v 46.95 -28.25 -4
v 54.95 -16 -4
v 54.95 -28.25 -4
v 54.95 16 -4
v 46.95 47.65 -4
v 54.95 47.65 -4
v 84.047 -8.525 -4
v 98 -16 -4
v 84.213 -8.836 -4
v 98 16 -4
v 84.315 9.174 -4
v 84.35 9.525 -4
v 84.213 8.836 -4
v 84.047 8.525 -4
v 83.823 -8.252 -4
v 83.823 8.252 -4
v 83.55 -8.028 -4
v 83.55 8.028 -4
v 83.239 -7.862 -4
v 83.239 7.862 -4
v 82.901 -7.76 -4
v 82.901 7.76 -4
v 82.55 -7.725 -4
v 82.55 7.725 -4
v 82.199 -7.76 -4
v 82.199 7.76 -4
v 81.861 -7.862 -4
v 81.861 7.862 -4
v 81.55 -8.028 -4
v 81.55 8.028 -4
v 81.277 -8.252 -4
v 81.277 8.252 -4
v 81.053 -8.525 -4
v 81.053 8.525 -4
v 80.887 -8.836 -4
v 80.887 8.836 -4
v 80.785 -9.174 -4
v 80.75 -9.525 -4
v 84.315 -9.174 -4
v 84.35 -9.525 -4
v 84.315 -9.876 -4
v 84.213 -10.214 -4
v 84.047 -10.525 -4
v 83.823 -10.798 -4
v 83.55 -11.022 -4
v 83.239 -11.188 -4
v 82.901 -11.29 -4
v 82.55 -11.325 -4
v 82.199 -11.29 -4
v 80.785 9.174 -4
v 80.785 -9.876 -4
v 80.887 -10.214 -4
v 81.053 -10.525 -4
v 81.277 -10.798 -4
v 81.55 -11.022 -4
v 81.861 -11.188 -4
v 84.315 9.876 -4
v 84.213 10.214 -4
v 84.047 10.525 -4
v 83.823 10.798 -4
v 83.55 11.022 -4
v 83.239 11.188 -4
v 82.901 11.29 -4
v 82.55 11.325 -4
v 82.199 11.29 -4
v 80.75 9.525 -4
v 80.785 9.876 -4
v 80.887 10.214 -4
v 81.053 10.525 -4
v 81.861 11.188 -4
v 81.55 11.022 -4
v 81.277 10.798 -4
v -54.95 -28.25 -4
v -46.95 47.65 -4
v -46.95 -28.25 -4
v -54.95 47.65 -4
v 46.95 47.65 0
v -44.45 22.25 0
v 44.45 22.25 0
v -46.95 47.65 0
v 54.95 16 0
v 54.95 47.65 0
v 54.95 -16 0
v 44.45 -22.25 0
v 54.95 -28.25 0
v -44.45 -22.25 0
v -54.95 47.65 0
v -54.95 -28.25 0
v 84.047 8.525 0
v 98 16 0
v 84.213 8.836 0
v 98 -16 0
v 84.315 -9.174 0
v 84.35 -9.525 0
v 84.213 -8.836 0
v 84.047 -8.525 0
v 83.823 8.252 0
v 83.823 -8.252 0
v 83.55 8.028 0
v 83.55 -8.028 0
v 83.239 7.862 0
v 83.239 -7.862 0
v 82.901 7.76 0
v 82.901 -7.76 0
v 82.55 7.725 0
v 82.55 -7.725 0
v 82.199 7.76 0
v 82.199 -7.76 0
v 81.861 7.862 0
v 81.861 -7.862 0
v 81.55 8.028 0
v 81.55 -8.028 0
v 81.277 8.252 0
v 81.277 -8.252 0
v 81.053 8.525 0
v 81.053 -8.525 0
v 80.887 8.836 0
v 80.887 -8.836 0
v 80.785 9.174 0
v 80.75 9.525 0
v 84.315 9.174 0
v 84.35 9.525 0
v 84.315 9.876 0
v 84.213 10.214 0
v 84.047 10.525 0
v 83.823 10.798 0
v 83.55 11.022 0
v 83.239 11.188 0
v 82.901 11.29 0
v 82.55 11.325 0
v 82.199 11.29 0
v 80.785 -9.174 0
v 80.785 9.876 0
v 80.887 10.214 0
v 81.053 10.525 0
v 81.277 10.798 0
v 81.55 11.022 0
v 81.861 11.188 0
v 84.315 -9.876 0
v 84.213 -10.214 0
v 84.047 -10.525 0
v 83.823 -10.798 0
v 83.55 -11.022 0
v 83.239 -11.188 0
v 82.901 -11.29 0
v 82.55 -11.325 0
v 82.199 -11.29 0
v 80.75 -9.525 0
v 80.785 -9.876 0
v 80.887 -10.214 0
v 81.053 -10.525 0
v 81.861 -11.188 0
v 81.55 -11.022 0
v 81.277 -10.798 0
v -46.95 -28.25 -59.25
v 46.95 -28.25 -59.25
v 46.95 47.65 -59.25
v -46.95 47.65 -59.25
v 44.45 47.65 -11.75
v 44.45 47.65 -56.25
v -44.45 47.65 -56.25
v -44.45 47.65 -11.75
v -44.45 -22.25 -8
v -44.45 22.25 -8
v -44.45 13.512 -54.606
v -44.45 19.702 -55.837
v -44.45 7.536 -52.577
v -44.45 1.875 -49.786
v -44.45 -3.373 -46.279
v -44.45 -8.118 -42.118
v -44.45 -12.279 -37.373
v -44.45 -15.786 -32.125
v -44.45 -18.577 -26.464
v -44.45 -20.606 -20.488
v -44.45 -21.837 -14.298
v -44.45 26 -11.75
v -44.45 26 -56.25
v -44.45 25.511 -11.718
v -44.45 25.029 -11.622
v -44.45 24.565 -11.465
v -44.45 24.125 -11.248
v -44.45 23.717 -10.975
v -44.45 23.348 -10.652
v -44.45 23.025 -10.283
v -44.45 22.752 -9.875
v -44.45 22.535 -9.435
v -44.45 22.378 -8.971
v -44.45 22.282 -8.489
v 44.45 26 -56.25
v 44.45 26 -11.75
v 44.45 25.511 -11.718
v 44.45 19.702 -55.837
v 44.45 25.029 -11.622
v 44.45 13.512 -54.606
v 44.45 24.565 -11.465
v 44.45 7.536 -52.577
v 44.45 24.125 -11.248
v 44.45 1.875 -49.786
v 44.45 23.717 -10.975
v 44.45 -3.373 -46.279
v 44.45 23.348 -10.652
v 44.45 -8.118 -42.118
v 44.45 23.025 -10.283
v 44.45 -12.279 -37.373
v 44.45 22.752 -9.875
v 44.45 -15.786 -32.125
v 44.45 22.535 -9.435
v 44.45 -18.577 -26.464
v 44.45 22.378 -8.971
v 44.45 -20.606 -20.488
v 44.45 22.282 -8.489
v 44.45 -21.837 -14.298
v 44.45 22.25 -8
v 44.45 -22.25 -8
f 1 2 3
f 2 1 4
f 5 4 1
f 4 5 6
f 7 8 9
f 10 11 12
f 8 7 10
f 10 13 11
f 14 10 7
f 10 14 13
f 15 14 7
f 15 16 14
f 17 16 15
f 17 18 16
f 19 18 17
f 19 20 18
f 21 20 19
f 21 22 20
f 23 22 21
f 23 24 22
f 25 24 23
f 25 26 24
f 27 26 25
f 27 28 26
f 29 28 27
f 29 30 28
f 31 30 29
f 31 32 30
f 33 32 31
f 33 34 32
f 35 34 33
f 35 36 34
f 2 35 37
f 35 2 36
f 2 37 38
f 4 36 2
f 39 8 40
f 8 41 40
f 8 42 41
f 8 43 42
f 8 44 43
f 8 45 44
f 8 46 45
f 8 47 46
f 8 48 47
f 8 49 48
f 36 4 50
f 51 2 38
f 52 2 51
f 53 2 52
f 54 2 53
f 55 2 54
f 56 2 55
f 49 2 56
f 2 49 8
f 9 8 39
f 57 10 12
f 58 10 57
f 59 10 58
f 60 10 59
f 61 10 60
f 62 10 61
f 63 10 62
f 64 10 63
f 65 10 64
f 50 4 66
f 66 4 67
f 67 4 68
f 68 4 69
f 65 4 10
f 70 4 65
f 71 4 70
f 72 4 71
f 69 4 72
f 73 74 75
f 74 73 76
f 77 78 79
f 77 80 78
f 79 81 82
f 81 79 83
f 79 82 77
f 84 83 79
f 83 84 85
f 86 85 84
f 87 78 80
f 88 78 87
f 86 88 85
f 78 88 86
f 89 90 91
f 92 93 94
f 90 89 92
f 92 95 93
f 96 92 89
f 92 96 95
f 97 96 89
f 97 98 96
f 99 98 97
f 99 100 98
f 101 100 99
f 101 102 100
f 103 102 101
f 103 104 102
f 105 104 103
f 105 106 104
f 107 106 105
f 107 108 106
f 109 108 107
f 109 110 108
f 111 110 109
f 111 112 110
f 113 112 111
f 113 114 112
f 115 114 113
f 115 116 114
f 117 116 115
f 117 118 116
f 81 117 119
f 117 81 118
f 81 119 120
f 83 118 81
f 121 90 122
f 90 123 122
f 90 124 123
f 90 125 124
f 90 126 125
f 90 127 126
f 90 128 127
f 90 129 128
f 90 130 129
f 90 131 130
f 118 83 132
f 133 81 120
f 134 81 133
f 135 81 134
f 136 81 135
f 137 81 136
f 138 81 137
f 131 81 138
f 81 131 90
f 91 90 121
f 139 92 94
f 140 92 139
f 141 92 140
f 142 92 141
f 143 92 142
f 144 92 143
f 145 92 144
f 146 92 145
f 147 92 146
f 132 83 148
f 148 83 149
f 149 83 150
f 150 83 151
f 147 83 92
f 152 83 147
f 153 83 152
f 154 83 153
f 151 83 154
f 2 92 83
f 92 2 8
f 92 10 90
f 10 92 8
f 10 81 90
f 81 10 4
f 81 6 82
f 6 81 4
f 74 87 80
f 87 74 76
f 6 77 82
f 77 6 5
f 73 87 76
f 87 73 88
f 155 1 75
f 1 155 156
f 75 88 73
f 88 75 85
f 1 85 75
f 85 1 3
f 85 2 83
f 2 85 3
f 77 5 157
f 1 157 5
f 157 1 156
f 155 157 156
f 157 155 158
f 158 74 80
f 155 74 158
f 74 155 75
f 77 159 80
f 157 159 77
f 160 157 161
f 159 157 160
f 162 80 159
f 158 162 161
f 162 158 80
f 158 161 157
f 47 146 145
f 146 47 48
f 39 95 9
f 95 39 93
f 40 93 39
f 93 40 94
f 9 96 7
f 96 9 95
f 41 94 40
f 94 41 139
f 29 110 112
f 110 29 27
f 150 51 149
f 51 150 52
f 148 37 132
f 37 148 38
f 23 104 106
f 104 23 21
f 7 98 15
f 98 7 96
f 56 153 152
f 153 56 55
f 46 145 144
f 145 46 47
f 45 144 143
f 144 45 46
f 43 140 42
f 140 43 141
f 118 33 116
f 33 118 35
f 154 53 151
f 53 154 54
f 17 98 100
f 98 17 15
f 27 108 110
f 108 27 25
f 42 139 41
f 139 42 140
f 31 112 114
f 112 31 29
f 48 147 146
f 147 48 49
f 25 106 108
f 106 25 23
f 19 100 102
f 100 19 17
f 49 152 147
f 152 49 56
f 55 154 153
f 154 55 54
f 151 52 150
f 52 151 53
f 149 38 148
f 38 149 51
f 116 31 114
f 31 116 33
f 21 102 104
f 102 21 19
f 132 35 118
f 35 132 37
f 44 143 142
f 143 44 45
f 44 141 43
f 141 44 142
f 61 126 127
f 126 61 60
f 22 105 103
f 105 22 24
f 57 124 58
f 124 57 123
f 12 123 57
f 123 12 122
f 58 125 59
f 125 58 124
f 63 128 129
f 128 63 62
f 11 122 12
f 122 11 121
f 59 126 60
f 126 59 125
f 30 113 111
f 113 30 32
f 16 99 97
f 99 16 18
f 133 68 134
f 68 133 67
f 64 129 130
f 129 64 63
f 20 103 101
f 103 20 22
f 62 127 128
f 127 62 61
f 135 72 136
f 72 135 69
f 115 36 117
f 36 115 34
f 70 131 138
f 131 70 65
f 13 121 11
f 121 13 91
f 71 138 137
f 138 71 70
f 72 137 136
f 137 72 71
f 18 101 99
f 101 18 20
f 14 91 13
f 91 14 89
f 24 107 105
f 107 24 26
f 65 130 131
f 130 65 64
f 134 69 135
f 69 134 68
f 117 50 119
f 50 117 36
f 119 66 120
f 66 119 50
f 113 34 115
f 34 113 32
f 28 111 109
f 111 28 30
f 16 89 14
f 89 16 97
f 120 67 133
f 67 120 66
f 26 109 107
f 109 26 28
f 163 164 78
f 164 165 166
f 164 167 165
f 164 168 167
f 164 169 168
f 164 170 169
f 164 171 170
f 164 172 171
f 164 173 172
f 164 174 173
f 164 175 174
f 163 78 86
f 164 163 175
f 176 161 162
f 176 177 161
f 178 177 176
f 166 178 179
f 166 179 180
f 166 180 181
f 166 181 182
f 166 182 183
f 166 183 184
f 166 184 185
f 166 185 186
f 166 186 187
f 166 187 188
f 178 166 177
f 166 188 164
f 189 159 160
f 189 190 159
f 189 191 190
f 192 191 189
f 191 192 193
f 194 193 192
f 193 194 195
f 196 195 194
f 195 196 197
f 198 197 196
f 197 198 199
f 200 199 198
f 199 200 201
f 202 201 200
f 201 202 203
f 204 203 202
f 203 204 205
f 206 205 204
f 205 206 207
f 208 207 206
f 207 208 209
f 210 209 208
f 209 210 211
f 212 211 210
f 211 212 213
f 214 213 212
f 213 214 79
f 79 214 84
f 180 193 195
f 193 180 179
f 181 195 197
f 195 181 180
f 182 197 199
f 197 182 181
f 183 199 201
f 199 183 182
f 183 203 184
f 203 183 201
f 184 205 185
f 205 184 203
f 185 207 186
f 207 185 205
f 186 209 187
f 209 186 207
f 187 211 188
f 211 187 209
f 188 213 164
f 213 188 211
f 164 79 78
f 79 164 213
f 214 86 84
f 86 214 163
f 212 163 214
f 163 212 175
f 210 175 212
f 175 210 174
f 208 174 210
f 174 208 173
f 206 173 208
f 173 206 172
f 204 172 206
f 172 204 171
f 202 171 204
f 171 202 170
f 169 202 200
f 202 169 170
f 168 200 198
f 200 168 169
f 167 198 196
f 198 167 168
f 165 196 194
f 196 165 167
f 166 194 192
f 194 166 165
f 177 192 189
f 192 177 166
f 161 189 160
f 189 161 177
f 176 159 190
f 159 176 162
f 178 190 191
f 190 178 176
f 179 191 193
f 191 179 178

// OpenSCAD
// TV speaker sound channel, v0.1 fit-test design.
//
// A clip/screw-on scoop for one bottom-firing TV speaker. It captures the
// sound at the underside grille and turns it 90 degrees so it exits toward
// the front of the TV.
//
// Print one normal and one mirrored channel:
//   side =  1  -> screw tab toward +X
//   side = -1  -> screw tab toward -X
//
// Coordinate system, in millimetres:
//   origin       centre of the speaker grille
//   z = 0        TV underside; the part extends downward to negative z
//   +y           toward the front face of the TV
//   x            along the width of the TV / long axis of the grille
//
// Measurements supplied by Jordan on 2026-11-16:
//   grille                    3.50 x 1.75 in (88.9 x 44.5 mm), flush underneath
//   TV front to grille front  1.00 in (25.4 mm)
//   screw-hole spacing        0.75 in (19.05 mm)
//   grille side to hole pair  1.50 in (38.1 mm)
//   TV side edge to grille    3.00 in (76.2 mm)
//   screw diameter            1/8 in (3.175 mm)
//
// Assumptions for this first fit test:
//   * The hole pair is on the outboard side of the grille.
//   * The 1.50 in dimension is to the centre of the hole pair. This also puts
//     the pair halfway between the TV edge and the grille (both gaps are 3 in
//     in total: 1.5 in from the edge to the pair and 1.5 in to the grille).
//   * hole_axis defaults to "front_back". Change it to "left_right" if the
//     two holes are spaced along the width of the TV instead.

side = 1;                    // [1, -1]
hole_axis = "front_back";    // ["front_back", "left_right"]

$fn = 48;

// ---------------------------------------------------------------------------
// Measured dimensions
// ---------------------------------------------------------------------------

grille_w = 88.9;             // 3.50 in, left-to-right
grille_d = 44.5;             // 1.75 in, front-to-back
front_to_grille = 25.4;      // front face to front edge of grille
hole_spacing = 19.05;        // 0.75 in, centre-to-centre
hole_pair_from_grille = 38.1;// 1.50 in, grille edge to pair centre
screw_d = 3.175;             // 1/8 in nominal screw

// ---------------------------------------------------------------------------
// Design dimensions
// ---------------------------------------------------------------------------

wall = 2.5;                  // duct side walls
back_wall = 6.0;             // material behind the air path
floor_t = 3.0;               // material below the air path
flange_t = 4.0;              // mounting plate thickness
flange_side_margin = 10.5;   // flange extension beside the grille
flange_back_margin = 6.0;    // flange extension behind the grille
hole_clearance_d = 3.6;      // printed clearance hole for the 1/8 in screw
tab_width = 32.0;            // front-to-back width of the screw tab
tab_end_margin = 15.45;      // tab material beyond the hole-pair centre

bend_leg = 8.0;              // straight drop before the bend starts
bend_radius = 26.0;          // centreline radius of the 90-degree turn

eps = 0.1;

// Derived dimensions
front_face_y = grille_d / 2 + front_to_grille;
flange_x = grille_w / 2 + flange_side_margin;
flange_back_y = -(grille_d / 2 + flange_back_margin);
body_back_y = -(grille_d / 2 + back_wall);
body_half_x = grille_w / 2 + wall;
hole_pair_x = side * (grille_w / 2 + hole_pair_from_grille);
tab_outer_x = abs(hole_pair_x) + tab_end_margin;
duct_drop = bend_leg + bend_radius + grille_d / 2 + floor_t;

// ---------------------------------------------------------------------------
// Air path
// ---------------------------------------------------------------------------

// The profile is drawn in 2D as (d, y), where d is distance below the TV
// underside and y is distance toward the front of the TV.
module air_path_profile() {
  union() {
    // Straight vertical portion. It starts slightly above z=0 in the final
    // part so the subtraction cuts cleanly through the mounting flange.
    translate([(bend_leg - 1) / 2, 0])
      square([bend_leg + 1, grille_d], center = true);

    // Round end of the vertical portion.
    translate([bend_leg, 0])
      circle(r = grille_d / 2);

    // Quarter-annulus bend.
    translate([bend_leg, bend_radius])
      intersection() {
        difference() {
          circle(r = bend_radius + grille_d / 2);
          circle(r = bend_radius - grille_d / 2);
        }
        // Keep the quadrant that turns downward flow toward +y.
        translate([0, -(bend_radius + grille_d / 2)])
          square([bend_radius + grille_d / 2,
                  bend_radius + grille_d / 2]);
      }

    // Straight horizontal portion, ending just beyond the TV front face.
    translate([bend_leg + bend_radius,
               (bend_radius + front_face_y + 1) / 2])
      square([grille_d, front_face_y + 1 - bend_radius], center = true);

    // Round joint at the start of the horizontal portion.
    translate([bend_leg + bend_radius, bend_radius])
      circle(r = grille_d / 2);
  }
}

// Extrude the profile across the grille width, then rotate it into the
// part coordinate system: profile d becomes -z and extrusion becomes x.
module air_path() {
  rotate([0, 90, 0])
    linear_extrude(height = grille_w, center = true)
      air_path_profile();
}

// ---------------------------------------------------------------------------
// Mounting flange
// ---------------------------------------------------------------------------

module flange_profile() {
  union() {
    // Main plate. Its front edge is flush with the front face of the TV.
    translate([0, (flange_back_y + front_face_y) / 2])
      square([2 * flange_x, front_face_y - flange_back_y], center = true);

    // Outboard tab. It starts 5 mm inside the main plate so the exported
    // part is a single fused solid rather than two pieces touching at a face.
    translate([side * ((flange_x - 5) + tab_outer_x) / 2, 0])
      square([tab_outer_x - flange_x + 5, tab_width], center = true);
  }
}

module flange() {
  translate([0, 0, -flange_t])
    linear_extrude(height = flange_t)
      flange_profile();
}

// ---------------------------------------------------------------------------
// Complete channel
// ---------------------------------------------------------------------------

module speaker_channel() {
  difference() {
    union() {
      flange();

      // Duct body. The top is coplanar with the TV underside and overlaps
      // the flange through its full thickness.
      translate([0, (body_back_y + front_face_y) / 2, -duct_drop / 2])
        cube([2 * body_half_x,
              front_face_y - body_back_y,
              duct_drop], center = true);
    }

    // Hollow 90-degree air path and grille opening.
    air_path();

    // Screw holes. Their positions are controlled by hole_axis.
    hole_positions =
      hole_axis == "left_right"
        ? [[hole_pair_x - hole_spacing / 2, 0],
           [hole_pair_x + hole_spacing / 2, 0]]
        : [[hole_pair_x, -hole_spacing / 2],
           [hole_pair_x,  hole_spacing / 2]];

    for (p = hole_positions)
      translate([p[0], p[1], -flange_t - eps])
        cylinder(h = flange_t + 2 * eps, d = hole_clearance_d, $fn = 32);
  }
}

speaker_channel();
